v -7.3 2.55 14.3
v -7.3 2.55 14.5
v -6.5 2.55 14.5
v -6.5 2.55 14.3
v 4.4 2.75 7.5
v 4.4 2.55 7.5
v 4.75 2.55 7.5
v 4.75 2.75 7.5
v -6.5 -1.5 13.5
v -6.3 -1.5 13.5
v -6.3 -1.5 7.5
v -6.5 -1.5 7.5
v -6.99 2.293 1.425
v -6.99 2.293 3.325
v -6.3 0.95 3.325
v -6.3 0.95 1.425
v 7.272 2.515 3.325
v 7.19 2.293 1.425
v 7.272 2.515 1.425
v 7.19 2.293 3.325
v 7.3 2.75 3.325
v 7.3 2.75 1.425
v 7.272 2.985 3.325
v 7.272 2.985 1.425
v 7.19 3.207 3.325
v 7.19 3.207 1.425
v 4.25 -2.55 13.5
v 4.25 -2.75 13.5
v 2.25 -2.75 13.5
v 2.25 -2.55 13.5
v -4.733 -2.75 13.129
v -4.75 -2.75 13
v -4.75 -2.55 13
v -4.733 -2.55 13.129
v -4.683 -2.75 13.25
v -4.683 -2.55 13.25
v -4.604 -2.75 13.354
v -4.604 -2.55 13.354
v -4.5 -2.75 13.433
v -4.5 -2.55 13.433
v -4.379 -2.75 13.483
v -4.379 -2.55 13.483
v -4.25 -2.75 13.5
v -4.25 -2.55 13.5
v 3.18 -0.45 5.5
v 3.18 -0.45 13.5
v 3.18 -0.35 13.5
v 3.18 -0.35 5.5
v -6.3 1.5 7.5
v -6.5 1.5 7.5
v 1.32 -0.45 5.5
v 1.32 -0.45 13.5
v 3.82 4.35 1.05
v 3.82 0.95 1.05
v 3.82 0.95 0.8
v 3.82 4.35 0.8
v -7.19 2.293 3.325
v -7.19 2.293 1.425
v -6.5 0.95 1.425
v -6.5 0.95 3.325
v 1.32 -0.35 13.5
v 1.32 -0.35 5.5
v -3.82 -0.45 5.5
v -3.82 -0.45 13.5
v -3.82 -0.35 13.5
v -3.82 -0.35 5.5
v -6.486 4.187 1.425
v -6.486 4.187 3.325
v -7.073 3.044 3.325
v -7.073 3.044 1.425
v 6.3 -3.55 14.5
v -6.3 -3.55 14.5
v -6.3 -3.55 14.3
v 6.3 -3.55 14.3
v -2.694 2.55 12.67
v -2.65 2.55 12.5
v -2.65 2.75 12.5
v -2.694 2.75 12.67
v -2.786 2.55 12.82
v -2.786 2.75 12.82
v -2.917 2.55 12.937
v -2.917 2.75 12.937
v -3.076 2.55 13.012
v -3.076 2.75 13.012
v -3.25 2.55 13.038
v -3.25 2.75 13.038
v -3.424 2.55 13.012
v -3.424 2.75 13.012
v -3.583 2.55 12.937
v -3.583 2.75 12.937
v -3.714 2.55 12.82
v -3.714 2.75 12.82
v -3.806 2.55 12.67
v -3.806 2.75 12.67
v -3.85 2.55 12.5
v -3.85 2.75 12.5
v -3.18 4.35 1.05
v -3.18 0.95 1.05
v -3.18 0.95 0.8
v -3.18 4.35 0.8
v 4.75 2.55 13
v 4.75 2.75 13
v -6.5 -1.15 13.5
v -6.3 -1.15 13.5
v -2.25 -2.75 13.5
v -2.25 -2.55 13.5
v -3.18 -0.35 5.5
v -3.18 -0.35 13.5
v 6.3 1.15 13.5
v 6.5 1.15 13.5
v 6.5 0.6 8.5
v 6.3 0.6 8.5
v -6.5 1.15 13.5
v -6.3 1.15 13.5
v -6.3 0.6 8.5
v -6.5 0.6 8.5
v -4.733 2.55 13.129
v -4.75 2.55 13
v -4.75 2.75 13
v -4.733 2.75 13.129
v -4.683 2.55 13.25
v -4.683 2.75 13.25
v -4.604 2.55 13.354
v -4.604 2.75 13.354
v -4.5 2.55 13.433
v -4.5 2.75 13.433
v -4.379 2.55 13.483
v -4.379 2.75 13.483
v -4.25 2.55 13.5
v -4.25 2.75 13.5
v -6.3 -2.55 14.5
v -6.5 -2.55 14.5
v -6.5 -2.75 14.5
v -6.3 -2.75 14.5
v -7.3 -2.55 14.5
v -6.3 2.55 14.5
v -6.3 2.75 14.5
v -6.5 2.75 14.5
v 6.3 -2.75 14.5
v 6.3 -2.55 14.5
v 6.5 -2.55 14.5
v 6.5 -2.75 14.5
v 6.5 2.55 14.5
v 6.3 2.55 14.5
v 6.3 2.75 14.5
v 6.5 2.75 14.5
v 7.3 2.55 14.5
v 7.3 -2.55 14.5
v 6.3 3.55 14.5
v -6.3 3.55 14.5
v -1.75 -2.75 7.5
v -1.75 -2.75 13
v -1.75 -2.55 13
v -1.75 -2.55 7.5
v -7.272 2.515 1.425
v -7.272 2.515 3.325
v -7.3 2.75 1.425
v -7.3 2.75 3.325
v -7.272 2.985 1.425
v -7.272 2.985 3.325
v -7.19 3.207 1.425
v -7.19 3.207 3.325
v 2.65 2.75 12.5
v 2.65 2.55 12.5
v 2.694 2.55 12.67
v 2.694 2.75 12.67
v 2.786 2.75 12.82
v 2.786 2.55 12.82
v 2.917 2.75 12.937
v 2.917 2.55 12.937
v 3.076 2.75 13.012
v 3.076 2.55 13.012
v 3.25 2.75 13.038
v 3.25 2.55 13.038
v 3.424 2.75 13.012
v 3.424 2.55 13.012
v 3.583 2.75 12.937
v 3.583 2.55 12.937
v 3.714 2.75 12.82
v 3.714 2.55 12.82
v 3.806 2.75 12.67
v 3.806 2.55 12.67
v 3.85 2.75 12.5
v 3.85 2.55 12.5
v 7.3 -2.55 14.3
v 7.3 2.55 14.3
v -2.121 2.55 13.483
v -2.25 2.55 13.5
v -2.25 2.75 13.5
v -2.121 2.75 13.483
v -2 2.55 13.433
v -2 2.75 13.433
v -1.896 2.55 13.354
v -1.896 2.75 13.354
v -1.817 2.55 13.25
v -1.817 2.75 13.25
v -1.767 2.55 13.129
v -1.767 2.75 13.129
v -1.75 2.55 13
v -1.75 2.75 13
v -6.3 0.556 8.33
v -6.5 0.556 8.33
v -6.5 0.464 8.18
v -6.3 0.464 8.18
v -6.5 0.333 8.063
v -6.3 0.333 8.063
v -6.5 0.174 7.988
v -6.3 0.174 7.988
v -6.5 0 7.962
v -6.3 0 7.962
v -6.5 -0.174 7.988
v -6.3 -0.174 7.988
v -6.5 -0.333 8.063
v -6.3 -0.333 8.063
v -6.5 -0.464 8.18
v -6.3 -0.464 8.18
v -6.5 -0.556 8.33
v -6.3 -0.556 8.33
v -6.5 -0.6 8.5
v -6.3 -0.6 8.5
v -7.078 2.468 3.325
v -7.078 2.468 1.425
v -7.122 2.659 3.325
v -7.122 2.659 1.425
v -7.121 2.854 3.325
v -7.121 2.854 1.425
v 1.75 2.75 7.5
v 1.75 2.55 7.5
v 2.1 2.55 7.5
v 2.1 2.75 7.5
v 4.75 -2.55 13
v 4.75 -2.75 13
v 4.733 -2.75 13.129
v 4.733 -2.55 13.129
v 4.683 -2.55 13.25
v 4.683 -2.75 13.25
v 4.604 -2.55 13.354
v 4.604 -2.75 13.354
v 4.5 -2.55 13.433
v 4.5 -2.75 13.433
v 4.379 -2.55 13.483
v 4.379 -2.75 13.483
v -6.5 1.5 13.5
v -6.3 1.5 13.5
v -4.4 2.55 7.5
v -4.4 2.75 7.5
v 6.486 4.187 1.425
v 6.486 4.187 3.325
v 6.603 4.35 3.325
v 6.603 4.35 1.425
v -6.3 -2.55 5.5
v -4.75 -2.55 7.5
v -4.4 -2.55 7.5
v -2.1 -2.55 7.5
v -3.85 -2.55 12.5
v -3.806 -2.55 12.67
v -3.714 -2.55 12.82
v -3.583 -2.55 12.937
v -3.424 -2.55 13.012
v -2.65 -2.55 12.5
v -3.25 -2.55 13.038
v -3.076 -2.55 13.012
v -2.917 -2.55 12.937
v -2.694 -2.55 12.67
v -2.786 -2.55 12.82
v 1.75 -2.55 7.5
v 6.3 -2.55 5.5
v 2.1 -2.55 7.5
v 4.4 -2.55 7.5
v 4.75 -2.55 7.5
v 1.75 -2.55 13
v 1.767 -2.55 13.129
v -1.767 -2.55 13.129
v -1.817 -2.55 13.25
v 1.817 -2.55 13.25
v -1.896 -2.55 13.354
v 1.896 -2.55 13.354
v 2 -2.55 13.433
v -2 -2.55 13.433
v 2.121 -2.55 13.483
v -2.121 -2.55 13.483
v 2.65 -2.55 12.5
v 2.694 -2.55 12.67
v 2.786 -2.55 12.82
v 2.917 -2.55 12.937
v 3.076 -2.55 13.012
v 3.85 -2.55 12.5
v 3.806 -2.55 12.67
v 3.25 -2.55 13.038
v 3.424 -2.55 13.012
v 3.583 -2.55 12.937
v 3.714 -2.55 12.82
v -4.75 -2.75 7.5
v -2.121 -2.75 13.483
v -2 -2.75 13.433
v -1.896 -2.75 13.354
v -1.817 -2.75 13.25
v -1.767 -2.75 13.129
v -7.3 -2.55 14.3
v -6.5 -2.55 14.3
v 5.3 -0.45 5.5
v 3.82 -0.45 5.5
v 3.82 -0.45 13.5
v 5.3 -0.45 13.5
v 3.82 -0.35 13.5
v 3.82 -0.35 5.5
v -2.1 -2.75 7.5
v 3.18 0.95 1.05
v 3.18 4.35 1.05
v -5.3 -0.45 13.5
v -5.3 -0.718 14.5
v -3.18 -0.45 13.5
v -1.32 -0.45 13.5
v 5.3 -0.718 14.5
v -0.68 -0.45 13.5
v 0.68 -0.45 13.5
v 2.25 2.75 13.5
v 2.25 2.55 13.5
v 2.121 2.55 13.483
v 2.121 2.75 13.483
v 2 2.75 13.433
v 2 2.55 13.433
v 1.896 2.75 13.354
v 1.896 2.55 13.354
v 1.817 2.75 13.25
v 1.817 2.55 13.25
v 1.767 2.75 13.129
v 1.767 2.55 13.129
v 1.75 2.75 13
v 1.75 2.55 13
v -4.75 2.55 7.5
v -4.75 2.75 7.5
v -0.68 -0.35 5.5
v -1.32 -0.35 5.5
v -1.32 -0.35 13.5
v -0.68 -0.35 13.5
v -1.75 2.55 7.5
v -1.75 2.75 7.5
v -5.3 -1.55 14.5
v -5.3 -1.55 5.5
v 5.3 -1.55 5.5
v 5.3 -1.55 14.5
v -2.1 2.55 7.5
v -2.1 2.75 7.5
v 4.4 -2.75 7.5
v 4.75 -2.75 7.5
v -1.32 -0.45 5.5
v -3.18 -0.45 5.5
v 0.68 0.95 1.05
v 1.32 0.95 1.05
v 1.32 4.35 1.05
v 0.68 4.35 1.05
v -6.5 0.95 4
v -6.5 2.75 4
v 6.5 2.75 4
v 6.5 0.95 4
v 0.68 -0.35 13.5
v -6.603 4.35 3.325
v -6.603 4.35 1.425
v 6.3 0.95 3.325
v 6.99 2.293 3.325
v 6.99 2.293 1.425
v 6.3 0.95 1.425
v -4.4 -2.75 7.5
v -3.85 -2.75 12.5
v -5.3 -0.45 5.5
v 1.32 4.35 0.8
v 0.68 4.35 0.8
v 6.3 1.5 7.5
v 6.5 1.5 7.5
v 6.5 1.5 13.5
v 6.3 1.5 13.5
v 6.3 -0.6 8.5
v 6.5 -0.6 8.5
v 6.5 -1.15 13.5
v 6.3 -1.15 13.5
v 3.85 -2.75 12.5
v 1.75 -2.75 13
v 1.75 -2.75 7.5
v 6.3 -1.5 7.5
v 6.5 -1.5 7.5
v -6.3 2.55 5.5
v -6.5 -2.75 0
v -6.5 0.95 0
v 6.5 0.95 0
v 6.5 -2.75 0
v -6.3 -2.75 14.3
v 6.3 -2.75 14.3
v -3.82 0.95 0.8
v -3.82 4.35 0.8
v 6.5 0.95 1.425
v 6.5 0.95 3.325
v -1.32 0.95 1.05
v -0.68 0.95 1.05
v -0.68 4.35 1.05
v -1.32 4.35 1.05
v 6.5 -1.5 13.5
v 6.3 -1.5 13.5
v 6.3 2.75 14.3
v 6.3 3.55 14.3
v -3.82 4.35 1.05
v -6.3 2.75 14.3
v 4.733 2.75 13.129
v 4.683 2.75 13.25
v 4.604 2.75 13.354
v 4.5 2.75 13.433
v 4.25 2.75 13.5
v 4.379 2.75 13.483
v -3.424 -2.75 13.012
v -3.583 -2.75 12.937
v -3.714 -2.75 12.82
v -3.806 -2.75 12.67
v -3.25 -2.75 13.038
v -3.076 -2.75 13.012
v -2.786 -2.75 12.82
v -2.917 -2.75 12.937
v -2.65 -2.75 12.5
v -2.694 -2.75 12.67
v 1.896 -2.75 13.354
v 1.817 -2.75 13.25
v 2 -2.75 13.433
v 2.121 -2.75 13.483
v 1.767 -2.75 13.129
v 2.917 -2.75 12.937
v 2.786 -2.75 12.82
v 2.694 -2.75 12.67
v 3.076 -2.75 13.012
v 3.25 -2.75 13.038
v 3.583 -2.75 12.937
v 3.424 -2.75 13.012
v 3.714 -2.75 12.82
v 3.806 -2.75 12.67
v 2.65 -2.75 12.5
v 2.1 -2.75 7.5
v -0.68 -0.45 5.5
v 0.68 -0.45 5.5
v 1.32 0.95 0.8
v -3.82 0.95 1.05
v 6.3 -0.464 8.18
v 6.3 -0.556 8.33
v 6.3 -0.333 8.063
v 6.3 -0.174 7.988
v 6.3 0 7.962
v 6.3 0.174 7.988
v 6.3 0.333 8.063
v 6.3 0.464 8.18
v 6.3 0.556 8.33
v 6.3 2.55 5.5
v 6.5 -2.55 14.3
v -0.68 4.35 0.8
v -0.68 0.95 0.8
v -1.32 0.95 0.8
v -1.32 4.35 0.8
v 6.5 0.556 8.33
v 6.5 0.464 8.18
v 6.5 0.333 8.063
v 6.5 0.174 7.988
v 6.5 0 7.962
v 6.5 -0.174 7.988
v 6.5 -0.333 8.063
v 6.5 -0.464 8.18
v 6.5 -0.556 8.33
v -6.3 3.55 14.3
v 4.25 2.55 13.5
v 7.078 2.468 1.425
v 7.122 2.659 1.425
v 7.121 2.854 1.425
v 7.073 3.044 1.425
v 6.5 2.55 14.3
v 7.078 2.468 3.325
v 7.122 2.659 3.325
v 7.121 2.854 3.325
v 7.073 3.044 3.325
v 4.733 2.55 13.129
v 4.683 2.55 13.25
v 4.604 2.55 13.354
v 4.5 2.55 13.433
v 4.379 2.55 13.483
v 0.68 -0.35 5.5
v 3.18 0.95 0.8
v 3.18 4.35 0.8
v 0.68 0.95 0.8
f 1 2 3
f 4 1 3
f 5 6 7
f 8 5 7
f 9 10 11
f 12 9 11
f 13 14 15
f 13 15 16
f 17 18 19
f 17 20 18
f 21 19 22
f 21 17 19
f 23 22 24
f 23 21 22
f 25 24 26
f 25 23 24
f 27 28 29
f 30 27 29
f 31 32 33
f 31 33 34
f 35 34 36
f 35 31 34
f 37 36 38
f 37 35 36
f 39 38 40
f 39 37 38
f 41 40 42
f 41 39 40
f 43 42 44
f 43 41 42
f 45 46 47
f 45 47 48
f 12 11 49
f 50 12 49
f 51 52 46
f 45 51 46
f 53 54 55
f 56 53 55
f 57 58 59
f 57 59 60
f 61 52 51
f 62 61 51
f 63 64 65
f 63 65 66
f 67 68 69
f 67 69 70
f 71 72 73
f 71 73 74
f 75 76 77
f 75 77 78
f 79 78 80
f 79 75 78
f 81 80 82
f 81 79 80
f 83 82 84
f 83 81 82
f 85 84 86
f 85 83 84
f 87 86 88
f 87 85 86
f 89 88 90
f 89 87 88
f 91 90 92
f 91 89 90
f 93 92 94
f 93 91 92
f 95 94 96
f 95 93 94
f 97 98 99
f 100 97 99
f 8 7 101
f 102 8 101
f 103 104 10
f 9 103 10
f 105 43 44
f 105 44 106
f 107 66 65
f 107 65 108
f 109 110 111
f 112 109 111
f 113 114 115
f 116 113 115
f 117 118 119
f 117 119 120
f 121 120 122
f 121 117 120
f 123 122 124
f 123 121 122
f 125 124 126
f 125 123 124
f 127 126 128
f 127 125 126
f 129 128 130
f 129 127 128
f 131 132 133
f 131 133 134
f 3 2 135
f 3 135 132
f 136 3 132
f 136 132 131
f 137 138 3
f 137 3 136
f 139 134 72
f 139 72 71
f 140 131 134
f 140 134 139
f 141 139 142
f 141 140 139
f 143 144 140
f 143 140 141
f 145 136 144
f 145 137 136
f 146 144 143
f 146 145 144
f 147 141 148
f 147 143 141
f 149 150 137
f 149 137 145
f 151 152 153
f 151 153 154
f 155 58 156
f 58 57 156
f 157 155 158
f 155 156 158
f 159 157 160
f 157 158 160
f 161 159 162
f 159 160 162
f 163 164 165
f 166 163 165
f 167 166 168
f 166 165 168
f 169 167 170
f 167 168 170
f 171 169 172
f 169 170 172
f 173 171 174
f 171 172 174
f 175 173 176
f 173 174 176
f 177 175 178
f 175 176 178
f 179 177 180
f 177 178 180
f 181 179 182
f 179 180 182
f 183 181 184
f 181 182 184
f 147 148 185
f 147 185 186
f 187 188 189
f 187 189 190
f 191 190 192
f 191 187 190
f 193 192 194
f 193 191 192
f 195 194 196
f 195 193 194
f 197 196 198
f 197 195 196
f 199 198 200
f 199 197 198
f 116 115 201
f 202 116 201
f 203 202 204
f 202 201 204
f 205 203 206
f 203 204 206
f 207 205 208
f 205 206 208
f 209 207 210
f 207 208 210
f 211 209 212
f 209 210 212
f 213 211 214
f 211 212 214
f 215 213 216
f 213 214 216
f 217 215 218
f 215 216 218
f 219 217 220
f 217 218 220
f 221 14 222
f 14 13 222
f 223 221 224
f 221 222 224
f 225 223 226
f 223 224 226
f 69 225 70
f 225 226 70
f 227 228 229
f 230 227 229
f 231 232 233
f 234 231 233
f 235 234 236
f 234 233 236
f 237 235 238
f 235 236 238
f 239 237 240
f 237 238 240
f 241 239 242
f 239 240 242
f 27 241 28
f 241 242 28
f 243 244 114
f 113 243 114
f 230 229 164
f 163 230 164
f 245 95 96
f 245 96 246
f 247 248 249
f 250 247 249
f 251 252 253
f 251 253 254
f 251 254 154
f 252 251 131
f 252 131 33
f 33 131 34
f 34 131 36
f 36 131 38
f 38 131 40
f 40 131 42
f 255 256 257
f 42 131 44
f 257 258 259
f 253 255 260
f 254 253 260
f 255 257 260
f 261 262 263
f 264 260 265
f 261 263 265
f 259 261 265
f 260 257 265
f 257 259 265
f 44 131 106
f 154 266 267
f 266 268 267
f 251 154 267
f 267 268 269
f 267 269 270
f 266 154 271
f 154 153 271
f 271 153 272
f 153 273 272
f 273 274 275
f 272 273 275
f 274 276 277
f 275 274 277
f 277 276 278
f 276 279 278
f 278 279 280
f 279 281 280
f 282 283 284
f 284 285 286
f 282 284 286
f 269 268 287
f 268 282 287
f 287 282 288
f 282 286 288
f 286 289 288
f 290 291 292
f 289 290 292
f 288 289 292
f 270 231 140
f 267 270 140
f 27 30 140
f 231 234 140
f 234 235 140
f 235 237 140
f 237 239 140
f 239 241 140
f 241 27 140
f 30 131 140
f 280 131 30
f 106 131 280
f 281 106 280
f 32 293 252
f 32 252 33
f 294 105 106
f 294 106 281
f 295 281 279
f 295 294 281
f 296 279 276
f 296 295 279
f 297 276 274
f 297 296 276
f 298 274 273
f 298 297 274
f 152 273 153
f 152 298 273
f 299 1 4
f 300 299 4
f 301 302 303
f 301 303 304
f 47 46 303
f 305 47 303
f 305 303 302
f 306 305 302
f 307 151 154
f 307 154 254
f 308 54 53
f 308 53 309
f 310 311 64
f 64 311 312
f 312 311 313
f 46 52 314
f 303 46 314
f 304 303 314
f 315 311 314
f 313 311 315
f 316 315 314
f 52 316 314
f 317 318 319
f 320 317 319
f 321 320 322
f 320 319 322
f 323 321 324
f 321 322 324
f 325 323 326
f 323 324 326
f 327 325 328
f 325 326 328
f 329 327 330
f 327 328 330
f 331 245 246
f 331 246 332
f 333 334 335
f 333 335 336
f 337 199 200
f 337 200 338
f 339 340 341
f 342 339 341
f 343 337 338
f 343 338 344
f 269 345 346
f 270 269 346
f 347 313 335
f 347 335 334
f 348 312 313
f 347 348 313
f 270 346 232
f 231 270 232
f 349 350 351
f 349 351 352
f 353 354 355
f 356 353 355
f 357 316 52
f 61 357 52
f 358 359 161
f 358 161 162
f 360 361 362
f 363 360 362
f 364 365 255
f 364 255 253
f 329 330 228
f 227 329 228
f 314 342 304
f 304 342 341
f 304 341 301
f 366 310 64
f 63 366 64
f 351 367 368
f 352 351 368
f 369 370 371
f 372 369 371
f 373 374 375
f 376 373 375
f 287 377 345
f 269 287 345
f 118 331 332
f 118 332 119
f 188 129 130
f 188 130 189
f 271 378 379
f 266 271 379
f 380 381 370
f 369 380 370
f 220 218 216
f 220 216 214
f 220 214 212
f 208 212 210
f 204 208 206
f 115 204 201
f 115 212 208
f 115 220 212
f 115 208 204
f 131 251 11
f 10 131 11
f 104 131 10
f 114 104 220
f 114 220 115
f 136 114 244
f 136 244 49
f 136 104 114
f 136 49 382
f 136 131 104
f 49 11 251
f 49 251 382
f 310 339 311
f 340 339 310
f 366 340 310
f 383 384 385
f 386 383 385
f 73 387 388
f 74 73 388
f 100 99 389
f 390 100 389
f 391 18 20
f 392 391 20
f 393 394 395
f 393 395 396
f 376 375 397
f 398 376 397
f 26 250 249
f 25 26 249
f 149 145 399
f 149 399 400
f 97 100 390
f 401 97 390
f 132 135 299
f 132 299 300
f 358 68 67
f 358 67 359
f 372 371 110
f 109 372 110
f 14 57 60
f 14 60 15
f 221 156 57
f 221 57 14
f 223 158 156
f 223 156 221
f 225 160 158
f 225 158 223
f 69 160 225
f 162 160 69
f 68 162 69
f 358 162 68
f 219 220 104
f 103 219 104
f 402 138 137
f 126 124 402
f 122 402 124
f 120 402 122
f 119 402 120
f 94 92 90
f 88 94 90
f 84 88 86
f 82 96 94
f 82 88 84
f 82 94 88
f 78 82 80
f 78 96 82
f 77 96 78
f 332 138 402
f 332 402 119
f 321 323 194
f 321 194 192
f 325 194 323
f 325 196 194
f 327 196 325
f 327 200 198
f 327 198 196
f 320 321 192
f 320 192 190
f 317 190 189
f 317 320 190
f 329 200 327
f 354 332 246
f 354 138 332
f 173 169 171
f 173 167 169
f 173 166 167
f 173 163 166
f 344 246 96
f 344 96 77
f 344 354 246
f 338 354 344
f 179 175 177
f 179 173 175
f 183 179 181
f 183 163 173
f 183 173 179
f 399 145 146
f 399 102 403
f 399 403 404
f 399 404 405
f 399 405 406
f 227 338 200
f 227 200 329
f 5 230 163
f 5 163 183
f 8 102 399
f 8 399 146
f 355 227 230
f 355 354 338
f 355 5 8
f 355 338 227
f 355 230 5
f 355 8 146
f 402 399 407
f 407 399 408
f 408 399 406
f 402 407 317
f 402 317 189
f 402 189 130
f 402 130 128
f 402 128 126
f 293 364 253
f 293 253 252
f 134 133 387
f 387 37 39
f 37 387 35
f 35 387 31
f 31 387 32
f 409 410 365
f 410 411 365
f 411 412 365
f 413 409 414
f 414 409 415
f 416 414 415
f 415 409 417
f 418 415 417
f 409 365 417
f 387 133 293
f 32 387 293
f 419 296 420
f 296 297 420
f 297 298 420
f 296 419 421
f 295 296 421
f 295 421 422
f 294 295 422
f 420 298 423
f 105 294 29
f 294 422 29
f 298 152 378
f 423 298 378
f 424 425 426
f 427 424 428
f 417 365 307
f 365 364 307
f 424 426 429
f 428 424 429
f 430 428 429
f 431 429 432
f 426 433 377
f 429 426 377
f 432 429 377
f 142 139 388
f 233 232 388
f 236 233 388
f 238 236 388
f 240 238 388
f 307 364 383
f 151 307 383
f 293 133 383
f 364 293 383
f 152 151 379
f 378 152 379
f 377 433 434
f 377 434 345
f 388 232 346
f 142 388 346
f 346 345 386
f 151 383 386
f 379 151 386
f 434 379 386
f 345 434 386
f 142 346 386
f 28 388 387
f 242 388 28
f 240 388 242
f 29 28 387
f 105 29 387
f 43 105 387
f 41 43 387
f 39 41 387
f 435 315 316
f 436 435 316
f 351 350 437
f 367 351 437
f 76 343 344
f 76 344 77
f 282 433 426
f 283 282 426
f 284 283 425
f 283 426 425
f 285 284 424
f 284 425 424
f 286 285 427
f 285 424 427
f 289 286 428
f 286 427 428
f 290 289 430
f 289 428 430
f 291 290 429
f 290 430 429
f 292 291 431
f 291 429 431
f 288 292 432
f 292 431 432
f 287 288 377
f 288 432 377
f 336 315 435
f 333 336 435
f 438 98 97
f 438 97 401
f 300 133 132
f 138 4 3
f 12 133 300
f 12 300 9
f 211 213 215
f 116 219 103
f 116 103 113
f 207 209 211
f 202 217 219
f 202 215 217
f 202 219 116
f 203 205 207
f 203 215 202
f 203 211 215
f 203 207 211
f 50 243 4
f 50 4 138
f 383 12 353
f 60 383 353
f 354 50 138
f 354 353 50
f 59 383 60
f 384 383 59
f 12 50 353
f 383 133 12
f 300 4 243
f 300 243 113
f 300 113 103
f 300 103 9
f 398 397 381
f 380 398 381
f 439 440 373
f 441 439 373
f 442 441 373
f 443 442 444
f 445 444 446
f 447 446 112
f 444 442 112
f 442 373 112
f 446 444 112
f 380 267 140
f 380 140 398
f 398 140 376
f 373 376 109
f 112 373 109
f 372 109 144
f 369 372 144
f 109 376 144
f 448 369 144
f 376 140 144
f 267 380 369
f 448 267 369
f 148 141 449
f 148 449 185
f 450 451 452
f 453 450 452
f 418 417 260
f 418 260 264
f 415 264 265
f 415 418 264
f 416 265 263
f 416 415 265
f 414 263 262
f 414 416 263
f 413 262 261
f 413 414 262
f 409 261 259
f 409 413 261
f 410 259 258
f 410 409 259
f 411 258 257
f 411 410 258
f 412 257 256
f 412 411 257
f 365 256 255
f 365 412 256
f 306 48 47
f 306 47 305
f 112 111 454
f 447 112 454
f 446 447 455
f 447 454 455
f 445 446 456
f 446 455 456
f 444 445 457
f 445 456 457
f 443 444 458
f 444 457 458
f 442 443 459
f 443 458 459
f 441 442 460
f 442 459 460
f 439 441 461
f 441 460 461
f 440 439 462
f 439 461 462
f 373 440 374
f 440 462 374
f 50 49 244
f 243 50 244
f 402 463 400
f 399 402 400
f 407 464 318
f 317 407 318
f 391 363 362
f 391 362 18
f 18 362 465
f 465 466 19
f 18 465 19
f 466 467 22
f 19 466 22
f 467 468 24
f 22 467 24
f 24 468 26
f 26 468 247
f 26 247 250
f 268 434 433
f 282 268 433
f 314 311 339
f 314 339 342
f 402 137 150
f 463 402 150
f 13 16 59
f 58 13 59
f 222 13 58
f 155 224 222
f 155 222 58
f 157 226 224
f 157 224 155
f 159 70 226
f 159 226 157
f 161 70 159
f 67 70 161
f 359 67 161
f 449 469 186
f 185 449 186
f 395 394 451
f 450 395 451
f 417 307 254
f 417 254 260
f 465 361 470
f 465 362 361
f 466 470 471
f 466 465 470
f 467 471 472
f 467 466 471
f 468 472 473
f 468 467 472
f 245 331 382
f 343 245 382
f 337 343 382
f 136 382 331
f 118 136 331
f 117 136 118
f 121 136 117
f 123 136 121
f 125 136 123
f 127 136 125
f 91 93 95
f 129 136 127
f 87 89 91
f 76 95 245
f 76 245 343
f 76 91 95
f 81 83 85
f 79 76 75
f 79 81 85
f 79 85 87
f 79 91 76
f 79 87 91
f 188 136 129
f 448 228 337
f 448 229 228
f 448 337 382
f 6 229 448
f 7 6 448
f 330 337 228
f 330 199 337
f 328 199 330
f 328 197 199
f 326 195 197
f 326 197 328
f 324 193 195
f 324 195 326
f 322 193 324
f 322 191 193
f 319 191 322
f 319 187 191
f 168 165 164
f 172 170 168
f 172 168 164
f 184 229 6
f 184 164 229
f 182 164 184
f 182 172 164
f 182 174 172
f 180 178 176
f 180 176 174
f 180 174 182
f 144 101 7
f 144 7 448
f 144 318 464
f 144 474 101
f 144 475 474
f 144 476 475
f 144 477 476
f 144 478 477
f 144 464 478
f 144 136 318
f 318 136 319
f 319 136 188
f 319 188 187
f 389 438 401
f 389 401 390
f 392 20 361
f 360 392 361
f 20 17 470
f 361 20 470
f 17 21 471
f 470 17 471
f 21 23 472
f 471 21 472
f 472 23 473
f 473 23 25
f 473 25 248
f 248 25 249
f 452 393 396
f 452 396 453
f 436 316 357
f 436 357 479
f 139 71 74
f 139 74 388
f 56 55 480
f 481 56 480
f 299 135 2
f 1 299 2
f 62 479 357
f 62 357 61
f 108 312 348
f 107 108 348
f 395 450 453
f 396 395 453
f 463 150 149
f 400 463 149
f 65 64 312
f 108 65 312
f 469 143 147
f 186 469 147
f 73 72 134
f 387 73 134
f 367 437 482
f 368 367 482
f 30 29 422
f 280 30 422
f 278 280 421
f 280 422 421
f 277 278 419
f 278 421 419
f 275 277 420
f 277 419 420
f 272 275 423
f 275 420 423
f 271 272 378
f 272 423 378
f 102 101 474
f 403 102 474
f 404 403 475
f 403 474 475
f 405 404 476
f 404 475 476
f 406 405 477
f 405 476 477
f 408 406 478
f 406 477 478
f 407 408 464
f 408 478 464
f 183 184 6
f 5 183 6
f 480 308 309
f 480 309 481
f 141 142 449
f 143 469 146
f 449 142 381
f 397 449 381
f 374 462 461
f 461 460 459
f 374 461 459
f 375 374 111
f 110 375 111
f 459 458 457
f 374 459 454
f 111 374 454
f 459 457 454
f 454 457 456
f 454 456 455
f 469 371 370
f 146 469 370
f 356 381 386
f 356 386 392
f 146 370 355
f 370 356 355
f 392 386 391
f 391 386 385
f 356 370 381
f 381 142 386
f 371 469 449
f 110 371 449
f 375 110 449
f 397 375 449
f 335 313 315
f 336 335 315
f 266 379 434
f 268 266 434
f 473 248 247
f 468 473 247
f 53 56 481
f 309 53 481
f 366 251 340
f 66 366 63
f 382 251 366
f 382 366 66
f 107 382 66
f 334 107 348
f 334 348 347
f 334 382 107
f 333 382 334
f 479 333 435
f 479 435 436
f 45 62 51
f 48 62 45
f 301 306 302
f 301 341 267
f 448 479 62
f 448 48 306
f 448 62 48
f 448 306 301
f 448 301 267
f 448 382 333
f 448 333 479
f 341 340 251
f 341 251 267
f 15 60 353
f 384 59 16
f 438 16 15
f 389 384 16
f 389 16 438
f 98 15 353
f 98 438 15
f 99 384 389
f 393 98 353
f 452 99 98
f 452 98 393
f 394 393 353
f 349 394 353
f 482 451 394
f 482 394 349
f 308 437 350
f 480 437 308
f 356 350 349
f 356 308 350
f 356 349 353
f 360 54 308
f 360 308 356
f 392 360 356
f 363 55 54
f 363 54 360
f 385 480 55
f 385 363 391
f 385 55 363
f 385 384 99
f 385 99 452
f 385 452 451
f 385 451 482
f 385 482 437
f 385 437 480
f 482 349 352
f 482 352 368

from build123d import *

# Parameters (mm, degrees)
SKETCH_1_W           = 13
SKETCH_1_H           = 5.5
EXTRUDE_1_DEPTH      = 14.5
SKETCH_2_W           = 12.6
SKETCH_2_H           = 5.1
CUT_EXTRUDE_1_DEPTH  = 9
CUT_EXTRUDE_3_DEPTH  = 17.815171721
CUT_EXTRUDE_4_DEPTH  = 20.667549415
SKETCH_5_W           = 10.6
SKETCH_5_H           = 1.1
EXTRUDE_3_DEPTH      = 9
CHAMFER_1_SIZE       = 1
CHAMFER_1_SIZE2      = 0.267949192
SKETCH_3_W           = 13
SKETCH_3_H           = 4
CUT_EXTRUDE_2_DEPTH  = 1.8
SKETCH_9_W           = 0.64
SKETCH_9_H           = 0.25
EXTRUDE_5_DEPTH      = 3.4
SKETCH_14_W          = 0.64
SKETCH_14_H          = 8.130016943
EXTRUDE_6_DEPTH      = 0.1
SKETCH_15_W          = 0.2
SKETCH_15_H          = 1.9
SKETCH_17_W          = 12.6
SKETCH_17_H          = 0.8
SKETCH_17_W_2        = 0.8
SKETCH_17_H_2        = 5.1
EXTRUDE_14_7_1_DEPTH = 0.2


with BuildPart() as part:
    # 草图1 → 凸台-拉伸1 (new body)
    with BuildSketch(Plane.XY):
        Rectangle(SKETCH_1_W, SKETCH_1_H)
    extrude(amount=EXTRUDE_1_DEPTH)

    # 草图2 → 切除-拉伸1 (cut)
    with BuildSketch(Plane.XY.offset(14.5)):
        Rectangle(SKETCH_2_W, SKETCH_2_H)
    extrude(amount=-CUT_EXTRUDE_1_DEPTH, mode=Mode.SUBTRACT)

    # 草图11 → 切除-拉伸3 (cut, through all)
    with BuildSketch(Plane.XZ.offset(2.75)):
        with BuildLine():
            Line((4.75, 7.5), (4.75, 13))
            ThreePointArc((4.75, 13), (4.603553391, 13.353553391), (4.25, 13.5))
            Line((4.25, 13.5), (2.25, 13.5))
            ThreePointArc((2.25, 13.5), (1.896446609, 13.353553391), (1.75, 13))
            Line((1.75, 13), (1.75, 7.5))
            Line((1.75, 7.5), (2.1, 7.5))
            Line((2.1, 7.5), (2.65, 12.5))
            ThreePointArc((2.65, 12.5), (3.25, 13.037619085), (3.85, 12.5))
            Line((3.85, 12.5), (4.4, 7.5))
            Line((4.4, 7.5), (4.75, 7.5))
        make_face()
        with BuildLine():
            Line((-3.85, 12.5), (-4.4, 7.5))
            Line((-4.4, 7.5), (-4.75, 7.5))
            Line((-4.75, 7.5), (-4.75, 13))
            ThreePointArc((-4.75, 13), (-4.603553391, 13.353553391), (-4.25, 13.5))
            Line((-4.25, 13.5), (-2.25, 13.5))
            ThreePointArc((-2.25, 13.5), (-1.896446609, 13.353553391), (-1.75, 13))
            Line((-1.75, 13), (-1.75, 7.5))
            Line((-1.75, 7.5), (-2.1, 7.5))
            Line((-2.1, 7.5), (-2.65, 12.5))
            ThreePointArc((-2.65, 12.5), (-3.25, 13.037619085), (-3.85, 12.5))
        make_face()
    extrude(amount=-CUT_EXTRUDE_3_DEPTH, mode=Mode.SUBTRACT)

    # 草图12 → 切除-拉伸4 (cut, through all)
    with BuildSketch(Plane(origin=(6.5, 0, 0), x_dir=(0, 0, -1), z_dir=(1, 0, 0))):
        with BuildLine():
            Line((-13.5, -1.5), (-7.5, -1.5))
            Line((-7.5, -1.5), (-7.5, 1.5))
            Line((-7.5, 1.5), (-13.5, 1.5))
            Line((-13.5, 1.5), (-13.5, 1.15))
            Line((-13.5, 1.15), (-8.5, 0.6))
            ThreePointArc((-8.5, 0.6), (-7.962380915, 0), (-8.5, -0.6))
            Line((-8.5, -0.6), (-13.5, -1.15))
            Line((-13.5, -1.15), (-13.5, -1.5))
        make_face()
    extrude(amount=-CUT_EXTRUDE_4_DEPTH, mode=Mode.SUBTRACT)

    # 草图5 → 凸台-拉伸3 (add)
    with BuildSketch(Plane.XY.offset(5.5)):
        with Locations((0, -1)):
            Rectangle(SKETCH_5_W, SKETCH_5_H)
    extrude(amount=EXTRUDE_3_DEPTH)

    # 倒角1
    chamfer_1_edges = [part.edges().sort_by_distance(p)[0] for p in [
        (0, -0.45, 14.5),
    ]]
    chamfer_1_side = [part.faces().sort_by_distance(p)[0] for p in [
        (0, -0.45, 10),
    ]]
    chamfer(chamfer_1_edges, length=CHAMFER_1_SIZE, length2=CHAMFER_1_SIZE2, reference=chamfer_1_side[0])

    # 草图3 → 切除-拉伸2 (cut)
    with BuildSketch(Plane(origin=(0, 2.75, 0), x_dir=(1, 0, 0), z_dir=(0, 1, 0))):
        with Locations((0, -2)):
            Rectangle(SKETCH_3_W, SKETCH_3_H)
    extrude(amount=-CUT_EXTRUDE_2_DEPTH, mode=Mode.SUBTRACT)

    # 草图9 → 凸台-拉伸5 (add)
    with BuildSketch(Plane(origin=(0, 0.95, 2.45), x_dir=(-1, 0, 0), z_dir=(0, -1, 0))):
        with Locations((-3.5, 1.525)):
            Rectangle(SKETCH_9_W, SKETCH_9_H)
        with Locations((1, 1.525)):
            Rectangle(SKETCH_9_W, SKETCH_9_H)
        with Locations((-1, 1.525)):
            Rectangle(SKETCH_9_W, SKETCH_9_H)
        with Locations((3.5, 1.525)):
            Rectangle(SKETCH_9_W, SKETCH_9_H)
    extrude(amount=-EXTRUDE_5_DEPTH)

    # 草图14 → 凸台-拉伸6 (add)
    with BuildSketch(Plane(origin=(0, -0.45, 0), x_dir=(1, 0, 0), z_dir=(0, 1, 0))):
        with Locations((-3.5, -9.434991528)):
            Rectangle(SKETCH_14_W, SKETCH_14_H)
        with Locations((-1, -9.434991528)):
            Rectangle(SKETCH_14_W, SKETCH_14_H)
        with Locations((1, -9.434991528)):
            Rectangle(SKETCH_14_W, SKETCH_14_H)
        with Locations((3.5, -9.434991528)):
            Rectangle(SKETCH_14_W, SKETCH_14_H)
    extrude(amount=EXTRUDE_6_DEPTH)

    # 扫描1: sweep along a path in 草图16
    with BuildLine(Plane(origin=(0, 0, 0), x_dir=(-1, 0, 0), z_dir=(0, 0, -1))) as sweep_1_path:
        Line((6.5, 0.95), (7.189615975, 2.293290664))
        ThreePointArc((7.189615975, 2.293290664), (7.3, 2.75), (7.189615975, 3.206709336))
        Line((7.189615975, 3.206709336), (6.602675615, 4.35))
    # 草图15 → 扫描1 (sweep)
    with BuildSketch(Plane(origin=(0, 0.95, 0), x_dir=(1, 0, 0), z_dir=(0, 1, 0))):
        with Locations((-6.4, -2.375)):
            Rectangle(SKETCH_15_W, SKETCH_15_H)
    sweep_1 = sweep(path=sweep_1_path.line)

    # 镜向1: 扫描1 across plane
    add(sweep_1.mirror(Plane(origin=(0, 0, 0), x_dir=(0, 0, 1), z_dir=(1, 0, 0))))

    # 草图17 → 卷边-外径14*7.1 (add)
    with BuildSketch(Plane.XY.offset(14.5)):
        with Locations((0, -3.15)):
            Rectangle(SKETCH_17_W, SKETCH_17_H)
        with Locations((6.9, 0)):
            Rectangle(SKETCH_17_W_2, SKETCH_17_H_2)
        with Locations((-6.9, 0)):
            Rectangle(SKETCH_17_W_2, SKETCH_17_H_2)
        with Locations((0, 3.15)):
            Rectangle(SKETCH_17_W, SKETCH_17_H)
    extrude(amount=-EXTRUDE_14_7_1_DEPTH)


solid = part.part
